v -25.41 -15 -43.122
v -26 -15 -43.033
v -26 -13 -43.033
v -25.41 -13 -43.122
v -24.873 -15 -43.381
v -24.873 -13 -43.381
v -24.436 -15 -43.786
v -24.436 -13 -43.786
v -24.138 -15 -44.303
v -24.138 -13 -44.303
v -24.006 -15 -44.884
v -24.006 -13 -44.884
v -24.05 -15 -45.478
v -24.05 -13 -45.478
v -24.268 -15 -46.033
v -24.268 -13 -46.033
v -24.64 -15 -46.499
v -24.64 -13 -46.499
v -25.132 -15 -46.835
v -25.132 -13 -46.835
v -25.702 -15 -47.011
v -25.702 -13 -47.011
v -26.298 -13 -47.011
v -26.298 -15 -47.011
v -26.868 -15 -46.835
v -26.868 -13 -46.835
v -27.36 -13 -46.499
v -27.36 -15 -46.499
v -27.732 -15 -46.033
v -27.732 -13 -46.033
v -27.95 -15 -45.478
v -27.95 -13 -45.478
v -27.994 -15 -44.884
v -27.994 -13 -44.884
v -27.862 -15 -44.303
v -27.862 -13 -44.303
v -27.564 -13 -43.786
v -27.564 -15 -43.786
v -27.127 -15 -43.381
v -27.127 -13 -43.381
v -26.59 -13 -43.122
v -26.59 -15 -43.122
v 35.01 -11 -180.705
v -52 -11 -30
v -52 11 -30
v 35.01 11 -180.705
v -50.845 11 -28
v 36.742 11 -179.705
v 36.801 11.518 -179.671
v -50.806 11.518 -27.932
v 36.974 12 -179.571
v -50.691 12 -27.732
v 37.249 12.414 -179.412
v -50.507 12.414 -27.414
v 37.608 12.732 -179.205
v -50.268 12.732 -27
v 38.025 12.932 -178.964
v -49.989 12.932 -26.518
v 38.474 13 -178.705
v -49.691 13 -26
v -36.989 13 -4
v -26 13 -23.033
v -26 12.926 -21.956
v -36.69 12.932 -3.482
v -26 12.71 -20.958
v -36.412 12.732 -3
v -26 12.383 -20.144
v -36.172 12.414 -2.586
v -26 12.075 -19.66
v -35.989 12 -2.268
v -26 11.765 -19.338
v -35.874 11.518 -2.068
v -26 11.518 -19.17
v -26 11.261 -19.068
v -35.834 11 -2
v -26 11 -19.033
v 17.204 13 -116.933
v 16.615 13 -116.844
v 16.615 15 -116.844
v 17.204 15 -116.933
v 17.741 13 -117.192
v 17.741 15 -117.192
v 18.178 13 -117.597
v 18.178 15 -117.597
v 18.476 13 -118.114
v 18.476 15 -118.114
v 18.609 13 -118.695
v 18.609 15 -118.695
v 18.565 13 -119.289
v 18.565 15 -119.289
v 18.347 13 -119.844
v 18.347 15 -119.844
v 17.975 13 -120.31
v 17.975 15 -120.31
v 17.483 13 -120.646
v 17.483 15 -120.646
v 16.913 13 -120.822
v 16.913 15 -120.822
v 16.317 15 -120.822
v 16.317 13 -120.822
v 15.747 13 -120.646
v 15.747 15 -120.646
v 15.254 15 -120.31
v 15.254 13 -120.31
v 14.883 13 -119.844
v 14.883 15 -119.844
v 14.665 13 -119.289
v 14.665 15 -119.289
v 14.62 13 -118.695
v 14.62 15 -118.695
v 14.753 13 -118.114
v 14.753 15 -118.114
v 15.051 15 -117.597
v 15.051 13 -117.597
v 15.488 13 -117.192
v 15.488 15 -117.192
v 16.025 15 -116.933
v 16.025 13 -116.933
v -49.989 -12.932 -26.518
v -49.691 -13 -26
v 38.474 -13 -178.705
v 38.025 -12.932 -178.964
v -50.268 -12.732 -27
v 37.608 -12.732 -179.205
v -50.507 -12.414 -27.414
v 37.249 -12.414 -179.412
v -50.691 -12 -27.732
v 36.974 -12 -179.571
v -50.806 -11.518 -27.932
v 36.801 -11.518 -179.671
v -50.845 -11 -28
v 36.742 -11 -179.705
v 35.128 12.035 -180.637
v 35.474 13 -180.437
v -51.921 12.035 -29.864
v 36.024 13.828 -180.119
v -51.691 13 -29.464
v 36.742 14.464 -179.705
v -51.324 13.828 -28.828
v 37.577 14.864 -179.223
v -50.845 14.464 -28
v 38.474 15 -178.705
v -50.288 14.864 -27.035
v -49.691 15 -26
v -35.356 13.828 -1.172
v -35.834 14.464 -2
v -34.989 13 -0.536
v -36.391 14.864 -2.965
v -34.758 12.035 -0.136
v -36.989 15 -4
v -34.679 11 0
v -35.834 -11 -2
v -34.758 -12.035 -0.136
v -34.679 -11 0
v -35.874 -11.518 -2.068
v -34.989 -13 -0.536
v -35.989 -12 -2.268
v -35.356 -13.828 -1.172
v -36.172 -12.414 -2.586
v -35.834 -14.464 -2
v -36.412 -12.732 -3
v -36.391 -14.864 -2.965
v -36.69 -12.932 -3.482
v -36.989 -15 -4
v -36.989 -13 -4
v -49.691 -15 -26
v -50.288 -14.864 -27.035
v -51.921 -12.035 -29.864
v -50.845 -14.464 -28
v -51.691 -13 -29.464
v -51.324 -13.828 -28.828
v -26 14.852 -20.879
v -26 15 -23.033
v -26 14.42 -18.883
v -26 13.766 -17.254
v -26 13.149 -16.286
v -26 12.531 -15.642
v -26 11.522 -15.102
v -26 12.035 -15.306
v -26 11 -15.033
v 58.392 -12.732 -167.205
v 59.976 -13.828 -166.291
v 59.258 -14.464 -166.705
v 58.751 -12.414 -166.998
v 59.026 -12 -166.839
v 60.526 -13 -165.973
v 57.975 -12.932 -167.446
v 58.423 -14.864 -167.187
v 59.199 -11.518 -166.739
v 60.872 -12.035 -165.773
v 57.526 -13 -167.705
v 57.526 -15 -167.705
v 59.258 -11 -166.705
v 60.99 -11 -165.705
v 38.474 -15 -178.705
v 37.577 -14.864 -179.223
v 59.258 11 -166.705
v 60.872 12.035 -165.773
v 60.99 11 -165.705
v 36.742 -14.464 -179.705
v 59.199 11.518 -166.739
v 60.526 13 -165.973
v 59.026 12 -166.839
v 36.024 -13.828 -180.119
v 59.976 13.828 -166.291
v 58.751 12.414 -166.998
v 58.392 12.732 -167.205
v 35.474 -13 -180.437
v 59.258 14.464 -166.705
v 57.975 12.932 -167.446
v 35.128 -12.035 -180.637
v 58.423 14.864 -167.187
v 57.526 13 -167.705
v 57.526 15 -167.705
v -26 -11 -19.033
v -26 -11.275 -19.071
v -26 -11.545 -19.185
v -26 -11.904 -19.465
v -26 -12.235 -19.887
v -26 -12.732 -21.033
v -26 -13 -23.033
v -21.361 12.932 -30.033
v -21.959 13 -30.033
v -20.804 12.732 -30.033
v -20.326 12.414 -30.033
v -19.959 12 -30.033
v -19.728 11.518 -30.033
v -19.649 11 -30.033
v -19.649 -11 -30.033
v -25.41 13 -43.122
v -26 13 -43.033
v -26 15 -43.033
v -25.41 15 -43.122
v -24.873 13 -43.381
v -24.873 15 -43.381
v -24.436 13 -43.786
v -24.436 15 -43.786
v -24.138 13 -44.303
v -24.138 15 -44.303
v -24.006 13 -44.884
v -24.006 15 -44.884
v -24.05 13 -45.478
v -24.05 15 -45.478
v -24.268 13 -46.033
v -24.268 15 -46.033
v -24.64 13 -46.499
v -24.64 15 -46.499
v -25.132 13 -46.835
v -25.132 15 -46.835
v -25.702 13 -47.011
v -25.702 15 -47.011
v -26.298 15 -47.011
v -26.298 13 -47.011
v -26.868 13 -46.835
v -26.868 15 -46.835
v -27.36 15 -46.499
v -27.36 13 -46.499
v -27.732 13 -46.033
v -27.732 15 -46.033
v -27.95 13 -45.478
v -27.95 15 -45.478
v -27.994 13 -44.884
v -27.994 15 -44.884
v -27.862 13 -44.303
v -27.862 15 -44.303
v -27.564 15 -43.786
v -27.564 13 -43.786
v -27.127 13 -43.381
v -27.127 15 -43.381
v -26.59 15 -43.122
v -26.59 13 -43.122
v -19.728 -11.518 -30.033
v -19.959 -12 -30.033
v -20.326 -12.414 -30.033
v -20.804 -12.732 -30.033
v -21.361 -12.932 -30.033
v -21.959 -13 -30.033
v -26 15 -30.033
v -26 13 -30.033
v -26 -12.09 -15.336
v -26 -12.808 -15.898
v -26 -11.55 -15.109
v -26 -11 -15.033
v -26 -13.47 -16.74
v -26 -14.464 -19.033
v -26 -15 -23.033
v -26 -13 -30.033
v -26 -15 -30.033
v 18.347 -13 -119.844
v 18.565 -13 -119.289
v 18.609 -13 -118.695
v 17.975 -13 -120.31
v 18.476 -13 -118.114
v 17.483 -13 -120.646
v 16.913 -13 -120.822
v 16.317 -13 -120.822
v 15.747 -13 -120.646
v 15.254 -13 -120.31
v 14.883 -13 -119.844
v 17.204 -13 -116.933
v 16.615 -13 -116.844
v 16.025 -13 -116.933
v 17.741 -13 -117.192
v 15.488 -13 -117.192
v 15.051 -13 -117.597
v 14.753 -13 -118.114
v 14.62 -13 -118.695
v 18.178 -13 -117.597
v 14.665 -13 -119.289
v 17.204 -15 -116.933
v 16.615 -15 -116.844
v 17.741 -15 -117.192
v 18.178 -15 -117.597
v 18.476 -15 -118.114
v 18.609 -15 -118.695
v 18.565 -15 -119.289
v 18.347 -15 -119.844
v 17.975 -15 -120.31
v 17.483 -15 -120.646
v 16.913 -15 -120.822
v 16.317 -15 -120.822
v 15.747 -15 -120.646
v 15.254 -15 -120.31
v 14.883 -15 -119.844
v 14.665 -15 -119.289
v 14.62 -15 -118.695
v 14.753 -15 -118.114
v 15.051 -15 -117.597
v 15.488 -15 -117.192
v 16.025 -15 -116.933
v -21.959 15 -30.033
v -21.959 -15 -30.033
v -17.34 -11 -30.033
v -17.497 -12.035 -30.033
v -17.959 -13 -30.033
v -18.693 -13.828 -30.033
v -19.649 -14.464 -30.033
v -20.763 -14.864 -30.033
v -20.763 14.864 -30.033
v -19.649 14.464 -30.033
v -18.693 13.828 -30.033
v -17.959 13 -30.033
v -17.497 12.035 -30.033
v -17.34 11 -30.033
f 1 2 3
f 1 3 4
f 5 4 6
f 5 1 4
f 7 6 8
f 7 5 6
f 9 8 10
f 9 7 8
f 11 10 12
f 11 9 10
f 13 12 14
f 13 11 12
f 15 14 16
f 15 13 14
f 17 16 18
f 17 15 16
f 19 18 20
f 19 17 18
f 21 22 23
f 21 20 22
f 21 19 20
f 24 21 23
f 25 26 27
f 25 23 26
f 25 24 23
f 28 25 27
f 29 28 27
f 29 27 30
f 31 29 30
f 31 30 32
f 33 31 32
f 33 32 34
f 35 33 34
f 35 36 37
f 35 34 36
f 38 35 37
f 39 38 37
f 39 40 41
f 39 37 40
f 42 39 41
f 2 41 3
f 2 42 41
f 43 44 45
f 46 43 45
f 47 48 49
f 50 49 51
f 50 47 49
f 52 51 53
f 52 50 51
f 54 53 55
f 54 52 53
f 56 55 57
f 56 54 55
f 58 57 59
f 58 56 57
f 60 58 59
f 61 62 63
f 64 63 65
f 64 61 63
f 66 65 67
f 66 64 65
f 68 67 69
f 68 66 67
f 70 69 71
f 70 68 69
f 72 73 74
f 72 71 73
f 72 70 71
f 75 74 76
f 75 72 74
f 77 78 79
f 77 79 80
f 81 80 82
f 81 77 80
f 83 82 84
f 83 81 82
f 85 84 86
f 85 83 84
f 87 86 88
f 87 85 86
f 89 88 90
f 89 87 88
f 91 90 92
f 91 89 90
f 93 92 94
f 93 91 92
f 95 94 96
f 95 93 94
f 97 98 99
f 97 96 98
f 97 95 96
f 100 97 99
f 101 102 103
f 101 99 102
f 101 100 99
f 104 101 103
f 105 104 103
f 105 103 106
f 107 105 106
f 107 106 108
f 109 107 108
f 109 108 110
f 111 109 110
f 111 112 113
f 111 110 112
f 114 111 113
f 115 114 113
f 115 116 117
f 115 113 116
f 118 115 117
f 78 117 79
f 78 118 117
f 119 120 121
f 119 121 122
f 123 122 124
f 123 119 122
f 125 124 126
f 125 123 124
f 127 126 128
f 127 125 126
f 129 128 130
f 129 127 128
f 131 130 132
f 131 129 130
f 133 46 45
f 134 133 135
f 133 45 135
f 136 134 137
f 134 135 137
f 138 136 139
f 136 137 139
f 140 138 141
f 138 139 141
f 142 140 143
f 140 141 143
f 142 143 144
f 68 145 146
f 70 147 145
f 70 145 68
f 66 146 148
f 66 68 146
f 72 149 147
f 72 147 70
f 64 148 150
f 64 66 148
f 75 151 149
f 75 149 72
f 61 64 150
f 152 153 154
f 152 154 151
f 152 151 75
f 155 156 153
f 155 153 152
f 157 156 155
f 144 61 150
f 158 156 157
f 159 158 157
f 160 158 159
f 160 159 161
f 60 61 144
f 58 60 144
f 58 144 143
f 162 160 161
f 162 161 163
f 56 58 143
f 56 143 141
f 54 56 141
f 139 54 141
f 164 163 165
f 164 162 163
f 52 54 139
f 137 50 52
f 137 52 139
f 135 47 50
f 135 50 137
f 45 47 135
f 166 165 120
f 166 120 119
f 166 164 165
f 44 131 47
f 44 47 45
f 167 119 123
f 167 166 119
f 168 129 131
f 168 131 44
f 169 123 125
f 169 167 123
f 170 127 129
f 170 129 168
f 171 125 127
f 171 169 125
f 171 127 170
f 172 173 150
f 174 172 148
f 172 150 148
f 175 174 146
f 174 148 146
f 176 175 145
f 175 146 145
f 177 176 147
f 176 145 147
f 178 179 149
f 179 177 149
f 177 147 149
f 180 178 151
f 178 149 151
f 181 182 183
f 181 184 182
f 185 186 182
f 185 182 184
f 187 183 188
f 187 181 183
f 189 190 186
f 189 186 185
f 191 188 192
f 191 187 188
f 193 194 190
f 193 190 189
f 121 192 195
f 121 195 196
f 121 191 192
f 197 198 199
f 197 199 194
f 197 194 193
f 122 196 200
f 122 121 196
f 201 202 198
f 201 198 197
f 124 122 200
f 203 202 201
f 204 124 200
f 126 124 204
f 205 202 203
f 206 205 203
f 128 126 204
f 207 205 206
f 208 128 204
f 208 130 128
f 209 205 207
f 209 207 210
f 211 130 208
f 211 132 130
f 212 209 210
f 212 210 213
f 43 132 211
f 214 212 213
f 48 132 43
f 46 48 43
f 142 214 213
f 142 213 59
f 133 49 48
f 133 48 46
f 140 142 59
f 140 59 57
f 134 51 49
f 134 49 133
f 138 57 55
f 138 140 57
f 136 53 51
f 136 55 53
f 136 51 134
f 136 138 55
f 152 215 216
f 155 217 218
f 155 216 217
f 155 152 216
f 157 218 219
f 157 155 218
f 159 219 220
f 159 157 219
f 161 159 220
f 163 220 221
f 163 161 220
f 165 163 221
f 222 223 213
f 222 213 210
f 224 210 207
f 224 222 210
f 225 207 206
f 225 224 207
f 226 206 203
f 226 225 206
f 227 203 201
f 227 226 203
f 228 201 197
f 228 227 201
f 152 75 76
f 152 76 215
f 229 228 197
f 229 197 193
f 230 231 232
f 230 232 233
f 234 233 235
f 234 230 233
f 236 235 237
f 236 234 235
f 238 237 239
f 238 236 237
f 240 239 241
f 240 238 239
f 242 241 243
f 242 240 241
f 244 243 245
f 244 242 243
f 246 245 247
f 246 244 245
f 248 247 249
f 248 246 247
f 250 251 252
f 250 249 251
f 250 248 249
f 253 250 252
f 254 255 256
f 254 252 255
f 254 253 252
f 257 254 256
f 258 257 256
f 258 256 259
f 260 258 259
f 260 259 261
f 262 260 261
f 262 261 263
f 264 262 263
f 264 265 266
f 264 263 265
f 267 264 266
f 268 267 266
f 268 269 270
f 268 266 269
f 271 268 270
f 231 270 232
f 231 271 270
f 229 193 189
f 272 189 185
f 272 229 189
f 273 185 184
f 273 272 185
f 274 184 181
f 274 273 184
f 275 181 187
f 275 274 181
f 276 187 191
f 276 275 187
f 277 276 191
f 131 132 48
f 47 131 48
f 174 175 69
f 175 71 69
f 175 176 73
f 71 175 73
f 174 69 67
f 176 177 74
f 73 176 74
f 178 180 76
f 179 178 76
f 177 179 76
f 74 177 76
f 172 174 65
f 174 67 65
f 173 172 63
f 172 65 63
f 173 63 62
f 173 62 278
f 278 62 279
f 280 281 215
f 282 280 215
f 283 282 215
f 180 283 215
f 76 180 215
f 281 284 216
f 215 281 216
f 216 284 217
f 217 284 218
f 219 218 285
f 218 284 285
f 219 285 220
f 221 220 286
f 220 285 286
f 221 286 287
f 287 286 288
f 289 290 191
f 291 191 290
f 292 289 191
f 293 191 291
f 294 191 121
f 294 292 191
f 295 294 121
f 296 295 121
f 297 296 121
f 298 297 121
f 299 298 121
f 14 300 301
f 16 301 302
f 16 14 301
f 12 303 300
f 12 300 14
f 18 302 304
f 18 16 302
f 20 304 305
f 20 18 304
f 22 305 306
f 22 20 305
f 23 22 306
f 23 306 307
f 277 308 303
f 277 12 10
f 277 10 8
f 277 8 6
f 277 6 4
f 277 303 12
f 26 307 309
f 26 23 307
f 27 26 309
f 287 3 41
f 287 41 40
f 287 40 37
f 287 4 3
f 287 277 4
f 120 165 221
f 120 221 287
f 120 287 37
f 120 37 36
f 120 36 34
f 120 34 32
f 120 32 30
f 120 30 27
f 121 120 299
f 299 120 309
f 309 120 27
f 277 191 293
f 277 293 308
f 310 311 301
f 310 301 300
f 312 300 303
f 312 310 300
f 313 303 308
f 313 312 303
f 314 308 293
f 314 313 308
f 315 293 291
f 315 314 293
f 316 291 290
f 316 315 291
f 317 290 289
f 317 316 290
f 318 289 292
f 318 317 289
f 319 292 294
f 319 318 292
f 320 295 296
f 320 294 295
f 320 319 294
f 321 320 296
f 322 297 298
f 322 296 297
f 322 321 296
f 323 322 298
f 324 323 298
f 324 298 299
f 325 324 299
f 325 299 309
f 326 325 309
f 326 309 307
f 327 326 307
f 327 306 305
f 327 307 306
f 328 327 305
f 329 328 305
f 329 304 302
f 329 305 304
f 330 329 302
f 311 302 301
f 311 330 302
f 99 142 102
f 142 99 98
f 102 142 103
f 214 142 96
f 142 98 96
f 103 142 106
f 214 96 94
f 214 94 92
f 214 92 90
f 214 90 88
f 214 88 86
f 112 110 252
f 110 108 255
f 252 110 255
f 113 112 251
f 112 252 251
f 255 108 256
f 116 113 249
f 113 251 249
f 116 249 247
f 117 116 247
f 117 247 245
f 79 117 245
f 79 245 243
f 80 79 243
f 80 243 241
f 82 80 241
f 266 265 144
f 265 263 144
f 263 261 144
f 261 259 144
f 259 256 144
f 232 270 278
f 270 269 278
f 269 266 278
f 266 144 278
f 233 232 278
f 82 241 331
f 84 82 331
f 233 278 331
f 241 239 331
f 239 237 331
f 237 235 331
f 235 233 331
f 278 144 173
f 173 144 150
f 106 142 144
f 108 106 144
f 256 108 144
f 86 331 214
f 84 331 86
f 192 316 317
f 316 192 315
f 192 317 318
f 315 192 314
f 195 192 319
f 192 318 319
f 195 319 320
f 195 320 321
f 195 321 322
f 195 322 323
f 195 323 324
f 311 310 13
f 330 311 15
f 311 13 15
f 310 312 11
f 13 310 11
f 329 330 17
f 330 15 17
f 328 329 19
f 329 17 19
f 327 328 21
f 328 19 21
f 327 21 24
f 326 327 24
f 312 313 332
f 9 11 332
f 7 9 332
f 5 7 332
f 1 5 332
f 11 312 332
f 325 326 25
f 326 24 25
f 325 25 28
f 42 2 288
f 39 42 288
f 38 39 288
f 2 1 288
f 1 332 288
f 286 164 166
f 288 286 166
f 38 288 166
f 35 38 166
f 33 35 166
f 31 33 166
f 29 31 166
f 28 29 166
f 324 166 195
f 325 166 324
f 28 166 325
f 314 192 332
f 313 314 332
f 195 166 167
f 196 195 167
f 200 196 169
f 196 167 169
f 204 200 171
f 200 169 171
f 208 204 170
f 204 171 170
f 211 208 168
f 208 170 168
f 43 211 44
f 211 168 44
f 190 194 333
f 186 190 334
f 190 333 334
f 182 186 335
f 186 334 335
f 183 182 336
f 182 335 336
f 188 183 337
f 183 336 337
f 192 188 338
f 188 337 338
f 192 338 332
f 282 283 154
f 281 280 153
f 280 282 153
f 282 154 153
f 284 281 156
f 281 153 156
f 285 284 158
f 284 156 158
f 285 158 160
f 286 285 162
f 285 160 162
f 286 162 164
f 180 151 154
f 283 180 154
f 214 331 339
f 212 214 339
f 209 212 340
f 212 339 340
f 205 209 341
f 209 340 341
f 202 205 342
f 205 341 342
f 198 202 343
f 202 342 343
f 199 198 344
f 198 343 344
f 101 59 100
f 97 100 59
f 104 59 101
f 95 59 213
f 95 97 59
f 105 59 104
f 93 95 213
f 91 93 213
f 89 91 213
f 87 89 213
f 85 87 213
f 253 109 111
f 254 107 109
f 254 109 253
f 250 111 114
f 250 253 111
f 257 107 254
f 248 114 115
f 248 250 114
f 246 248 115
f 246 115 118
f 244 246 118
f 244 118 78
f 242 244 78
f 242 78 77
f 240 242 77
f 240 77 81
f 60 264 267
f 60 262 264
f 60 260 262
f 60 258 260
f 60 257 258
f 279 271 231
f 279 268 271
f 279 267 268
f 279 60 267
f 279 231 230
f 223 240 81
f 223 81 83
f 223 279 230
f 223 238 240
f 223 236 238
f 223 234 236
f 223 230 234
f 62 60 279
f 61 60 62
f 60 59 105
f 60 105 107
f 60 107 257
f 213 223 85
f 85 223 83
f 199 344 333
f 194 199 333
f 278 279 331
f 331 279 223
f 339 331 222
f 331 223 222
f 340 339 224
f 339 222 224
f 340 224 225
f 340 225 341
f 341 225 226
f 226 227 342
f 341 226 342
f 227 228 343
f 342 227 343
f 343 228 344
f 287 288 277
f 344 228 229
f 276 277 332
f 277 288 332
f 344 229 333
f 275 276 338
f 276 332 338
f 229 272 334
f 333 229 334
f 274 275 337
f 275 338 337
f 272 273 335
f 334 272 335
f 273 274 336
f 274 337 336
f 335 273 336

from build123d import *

# Parameters (mm, degrees)
EXTRUDE_1_DEPTH          = 200
CUT_EXTRUDE_1_DEPTH      = 193.621587163
CUT_EXTRUDE_1_DEPTH_BACK = 193.621587163
CUT_EXTRUDE_2_DEPTH      = 192.309050473
CUT_EXTRUDE_2_DEPTH_BACK = 192.309050473
SKETCH_8_R               = 2
CUT_EXTRUDE_3_DEPTH      = 192.309050473
CUT_EXTRUDE_3_DEPTH_BACK = 192.309050473
SKETCH_9_W               = 52
SKETCH_9_H               = 25


with BuildPart() as part:
    # 草图5 → 凸台-拉伸1 (new body)
    with BuildSketch(Plane(origin=(-52, 0, 0), x_dir=(-0.8660254037844397, 0, -0.4999999999999983), z_dir=(0.4999999999999982, 0, -0.8660254037844396))):
        with BuildLine():
            Line((-11, -15), (11, -15))
            ThreePointArc((11, -15), (13.828427125, -13.828427125), (15, -11))
            Line((15, -11), (15, 11))
            ThreePointArc((15, 11), (13.828427125, 13.828427125), (11, 15))
            Line((11, 15), (-11, 15))
            ThreePointArc((-11, 15), (-13.828427125, 13.828427125), (-15, 11))
            Line((-15, 11), (-15, -11))
            ThreePointArc((-15, -11), (-13.828427125, -13.828427125), (-11, -15))
        make_face()
        with BuildLine():
            Line((-11, -13), (11, -13))
            ThreePointArc((11, -13), (12.414213562, -12.414213562), (13, -11))
            Line((13, -11), (13, 11))
            ThreePointArc((13, 11), (12.414213562, 12.414213562), (11, 13))
            Line((11, 13), (-11, 13))
            ThreePointArc((-11, 13), (-12.414213562, 12.414213562), (-13, 11))
            Line((-13, 11), (-13, -11))
            ThreePointArc((-13, -11), (-12.414213562, -12.414213562), (-11, -13))
        make_face(mode=Mode.SUBTRACT)
    extrude(amount=EXTRUDE_1_DEPTH)

    # 草图7 → 切除-拉伸1 (cut, two sides: drawn at the far end of the back side and taken through both)
    with BuildSketch(Plane(origin=(0, 0, 0), x_dir=(1, 0, 0), z_dir=(0, 1, 0)).offset(-CUT_EXTRUDE_1_DEPTH_BACK)):
        Polygon((2.851111613, -65.004912165), (-65.527886261, 53.430986323), (-91.508648375, 38.430986323), (-23.129650501, -80.004912165), align=None)
    extrude(amount=CUT_EXTRUDE_1_DEPTH + CUT_EXTRUDE_1_DEPTH_BACK, mode=Mode.SUBTRACT)

    # 草图8 → 切除-拉伸2 (cut, two sides: drawn at the far end of the back side and taken through both)
    with BuildSketch(Plane(origin=(0, 0, 0), x_dir=(1, 0, 0), z_dir=(0, 1, 0)).offset(-CUT_EXTRUDE_2_DEPTH_BACK)):
        with Locations(Location((-26, 45.033320997, 0), (0, 0, 270))):
            Circle(SKETCH_8_R)
        with Locations(Location((16.614746246, 118.844226646, 0), (0, 0, 270))):
            Circle(SKETCH_8_R)
    extrude(amount=CUT_EXTRUDE_2_DEPTH + CUT_EXTRUDE_2_DEPTH_BACK, mode=Mode.SUBTRACT)

    # 草图9 → 切除-拉伸3 (cut, two sides: drawn at the far end of the back side and taken through both)
    with BuildSketch(Plane(origin=(0, 0, 0), x_dir=(1, 0, 0), z_dir=(0, 1, 0)).offset(-CUT_EXTRUDE_3_DEPTH_BACK)):
        with Locations((0, 17.533320997)):
            Rectangle(SKETCH_9_W, SKETCH_9_H)
    extrude(amount=CUT_EXTRUDE_3_DEPTH + CUT_EXTRUDE_3_DEPTH_BACK, mode=Mode.SUBTRACT)


solid = part.part
